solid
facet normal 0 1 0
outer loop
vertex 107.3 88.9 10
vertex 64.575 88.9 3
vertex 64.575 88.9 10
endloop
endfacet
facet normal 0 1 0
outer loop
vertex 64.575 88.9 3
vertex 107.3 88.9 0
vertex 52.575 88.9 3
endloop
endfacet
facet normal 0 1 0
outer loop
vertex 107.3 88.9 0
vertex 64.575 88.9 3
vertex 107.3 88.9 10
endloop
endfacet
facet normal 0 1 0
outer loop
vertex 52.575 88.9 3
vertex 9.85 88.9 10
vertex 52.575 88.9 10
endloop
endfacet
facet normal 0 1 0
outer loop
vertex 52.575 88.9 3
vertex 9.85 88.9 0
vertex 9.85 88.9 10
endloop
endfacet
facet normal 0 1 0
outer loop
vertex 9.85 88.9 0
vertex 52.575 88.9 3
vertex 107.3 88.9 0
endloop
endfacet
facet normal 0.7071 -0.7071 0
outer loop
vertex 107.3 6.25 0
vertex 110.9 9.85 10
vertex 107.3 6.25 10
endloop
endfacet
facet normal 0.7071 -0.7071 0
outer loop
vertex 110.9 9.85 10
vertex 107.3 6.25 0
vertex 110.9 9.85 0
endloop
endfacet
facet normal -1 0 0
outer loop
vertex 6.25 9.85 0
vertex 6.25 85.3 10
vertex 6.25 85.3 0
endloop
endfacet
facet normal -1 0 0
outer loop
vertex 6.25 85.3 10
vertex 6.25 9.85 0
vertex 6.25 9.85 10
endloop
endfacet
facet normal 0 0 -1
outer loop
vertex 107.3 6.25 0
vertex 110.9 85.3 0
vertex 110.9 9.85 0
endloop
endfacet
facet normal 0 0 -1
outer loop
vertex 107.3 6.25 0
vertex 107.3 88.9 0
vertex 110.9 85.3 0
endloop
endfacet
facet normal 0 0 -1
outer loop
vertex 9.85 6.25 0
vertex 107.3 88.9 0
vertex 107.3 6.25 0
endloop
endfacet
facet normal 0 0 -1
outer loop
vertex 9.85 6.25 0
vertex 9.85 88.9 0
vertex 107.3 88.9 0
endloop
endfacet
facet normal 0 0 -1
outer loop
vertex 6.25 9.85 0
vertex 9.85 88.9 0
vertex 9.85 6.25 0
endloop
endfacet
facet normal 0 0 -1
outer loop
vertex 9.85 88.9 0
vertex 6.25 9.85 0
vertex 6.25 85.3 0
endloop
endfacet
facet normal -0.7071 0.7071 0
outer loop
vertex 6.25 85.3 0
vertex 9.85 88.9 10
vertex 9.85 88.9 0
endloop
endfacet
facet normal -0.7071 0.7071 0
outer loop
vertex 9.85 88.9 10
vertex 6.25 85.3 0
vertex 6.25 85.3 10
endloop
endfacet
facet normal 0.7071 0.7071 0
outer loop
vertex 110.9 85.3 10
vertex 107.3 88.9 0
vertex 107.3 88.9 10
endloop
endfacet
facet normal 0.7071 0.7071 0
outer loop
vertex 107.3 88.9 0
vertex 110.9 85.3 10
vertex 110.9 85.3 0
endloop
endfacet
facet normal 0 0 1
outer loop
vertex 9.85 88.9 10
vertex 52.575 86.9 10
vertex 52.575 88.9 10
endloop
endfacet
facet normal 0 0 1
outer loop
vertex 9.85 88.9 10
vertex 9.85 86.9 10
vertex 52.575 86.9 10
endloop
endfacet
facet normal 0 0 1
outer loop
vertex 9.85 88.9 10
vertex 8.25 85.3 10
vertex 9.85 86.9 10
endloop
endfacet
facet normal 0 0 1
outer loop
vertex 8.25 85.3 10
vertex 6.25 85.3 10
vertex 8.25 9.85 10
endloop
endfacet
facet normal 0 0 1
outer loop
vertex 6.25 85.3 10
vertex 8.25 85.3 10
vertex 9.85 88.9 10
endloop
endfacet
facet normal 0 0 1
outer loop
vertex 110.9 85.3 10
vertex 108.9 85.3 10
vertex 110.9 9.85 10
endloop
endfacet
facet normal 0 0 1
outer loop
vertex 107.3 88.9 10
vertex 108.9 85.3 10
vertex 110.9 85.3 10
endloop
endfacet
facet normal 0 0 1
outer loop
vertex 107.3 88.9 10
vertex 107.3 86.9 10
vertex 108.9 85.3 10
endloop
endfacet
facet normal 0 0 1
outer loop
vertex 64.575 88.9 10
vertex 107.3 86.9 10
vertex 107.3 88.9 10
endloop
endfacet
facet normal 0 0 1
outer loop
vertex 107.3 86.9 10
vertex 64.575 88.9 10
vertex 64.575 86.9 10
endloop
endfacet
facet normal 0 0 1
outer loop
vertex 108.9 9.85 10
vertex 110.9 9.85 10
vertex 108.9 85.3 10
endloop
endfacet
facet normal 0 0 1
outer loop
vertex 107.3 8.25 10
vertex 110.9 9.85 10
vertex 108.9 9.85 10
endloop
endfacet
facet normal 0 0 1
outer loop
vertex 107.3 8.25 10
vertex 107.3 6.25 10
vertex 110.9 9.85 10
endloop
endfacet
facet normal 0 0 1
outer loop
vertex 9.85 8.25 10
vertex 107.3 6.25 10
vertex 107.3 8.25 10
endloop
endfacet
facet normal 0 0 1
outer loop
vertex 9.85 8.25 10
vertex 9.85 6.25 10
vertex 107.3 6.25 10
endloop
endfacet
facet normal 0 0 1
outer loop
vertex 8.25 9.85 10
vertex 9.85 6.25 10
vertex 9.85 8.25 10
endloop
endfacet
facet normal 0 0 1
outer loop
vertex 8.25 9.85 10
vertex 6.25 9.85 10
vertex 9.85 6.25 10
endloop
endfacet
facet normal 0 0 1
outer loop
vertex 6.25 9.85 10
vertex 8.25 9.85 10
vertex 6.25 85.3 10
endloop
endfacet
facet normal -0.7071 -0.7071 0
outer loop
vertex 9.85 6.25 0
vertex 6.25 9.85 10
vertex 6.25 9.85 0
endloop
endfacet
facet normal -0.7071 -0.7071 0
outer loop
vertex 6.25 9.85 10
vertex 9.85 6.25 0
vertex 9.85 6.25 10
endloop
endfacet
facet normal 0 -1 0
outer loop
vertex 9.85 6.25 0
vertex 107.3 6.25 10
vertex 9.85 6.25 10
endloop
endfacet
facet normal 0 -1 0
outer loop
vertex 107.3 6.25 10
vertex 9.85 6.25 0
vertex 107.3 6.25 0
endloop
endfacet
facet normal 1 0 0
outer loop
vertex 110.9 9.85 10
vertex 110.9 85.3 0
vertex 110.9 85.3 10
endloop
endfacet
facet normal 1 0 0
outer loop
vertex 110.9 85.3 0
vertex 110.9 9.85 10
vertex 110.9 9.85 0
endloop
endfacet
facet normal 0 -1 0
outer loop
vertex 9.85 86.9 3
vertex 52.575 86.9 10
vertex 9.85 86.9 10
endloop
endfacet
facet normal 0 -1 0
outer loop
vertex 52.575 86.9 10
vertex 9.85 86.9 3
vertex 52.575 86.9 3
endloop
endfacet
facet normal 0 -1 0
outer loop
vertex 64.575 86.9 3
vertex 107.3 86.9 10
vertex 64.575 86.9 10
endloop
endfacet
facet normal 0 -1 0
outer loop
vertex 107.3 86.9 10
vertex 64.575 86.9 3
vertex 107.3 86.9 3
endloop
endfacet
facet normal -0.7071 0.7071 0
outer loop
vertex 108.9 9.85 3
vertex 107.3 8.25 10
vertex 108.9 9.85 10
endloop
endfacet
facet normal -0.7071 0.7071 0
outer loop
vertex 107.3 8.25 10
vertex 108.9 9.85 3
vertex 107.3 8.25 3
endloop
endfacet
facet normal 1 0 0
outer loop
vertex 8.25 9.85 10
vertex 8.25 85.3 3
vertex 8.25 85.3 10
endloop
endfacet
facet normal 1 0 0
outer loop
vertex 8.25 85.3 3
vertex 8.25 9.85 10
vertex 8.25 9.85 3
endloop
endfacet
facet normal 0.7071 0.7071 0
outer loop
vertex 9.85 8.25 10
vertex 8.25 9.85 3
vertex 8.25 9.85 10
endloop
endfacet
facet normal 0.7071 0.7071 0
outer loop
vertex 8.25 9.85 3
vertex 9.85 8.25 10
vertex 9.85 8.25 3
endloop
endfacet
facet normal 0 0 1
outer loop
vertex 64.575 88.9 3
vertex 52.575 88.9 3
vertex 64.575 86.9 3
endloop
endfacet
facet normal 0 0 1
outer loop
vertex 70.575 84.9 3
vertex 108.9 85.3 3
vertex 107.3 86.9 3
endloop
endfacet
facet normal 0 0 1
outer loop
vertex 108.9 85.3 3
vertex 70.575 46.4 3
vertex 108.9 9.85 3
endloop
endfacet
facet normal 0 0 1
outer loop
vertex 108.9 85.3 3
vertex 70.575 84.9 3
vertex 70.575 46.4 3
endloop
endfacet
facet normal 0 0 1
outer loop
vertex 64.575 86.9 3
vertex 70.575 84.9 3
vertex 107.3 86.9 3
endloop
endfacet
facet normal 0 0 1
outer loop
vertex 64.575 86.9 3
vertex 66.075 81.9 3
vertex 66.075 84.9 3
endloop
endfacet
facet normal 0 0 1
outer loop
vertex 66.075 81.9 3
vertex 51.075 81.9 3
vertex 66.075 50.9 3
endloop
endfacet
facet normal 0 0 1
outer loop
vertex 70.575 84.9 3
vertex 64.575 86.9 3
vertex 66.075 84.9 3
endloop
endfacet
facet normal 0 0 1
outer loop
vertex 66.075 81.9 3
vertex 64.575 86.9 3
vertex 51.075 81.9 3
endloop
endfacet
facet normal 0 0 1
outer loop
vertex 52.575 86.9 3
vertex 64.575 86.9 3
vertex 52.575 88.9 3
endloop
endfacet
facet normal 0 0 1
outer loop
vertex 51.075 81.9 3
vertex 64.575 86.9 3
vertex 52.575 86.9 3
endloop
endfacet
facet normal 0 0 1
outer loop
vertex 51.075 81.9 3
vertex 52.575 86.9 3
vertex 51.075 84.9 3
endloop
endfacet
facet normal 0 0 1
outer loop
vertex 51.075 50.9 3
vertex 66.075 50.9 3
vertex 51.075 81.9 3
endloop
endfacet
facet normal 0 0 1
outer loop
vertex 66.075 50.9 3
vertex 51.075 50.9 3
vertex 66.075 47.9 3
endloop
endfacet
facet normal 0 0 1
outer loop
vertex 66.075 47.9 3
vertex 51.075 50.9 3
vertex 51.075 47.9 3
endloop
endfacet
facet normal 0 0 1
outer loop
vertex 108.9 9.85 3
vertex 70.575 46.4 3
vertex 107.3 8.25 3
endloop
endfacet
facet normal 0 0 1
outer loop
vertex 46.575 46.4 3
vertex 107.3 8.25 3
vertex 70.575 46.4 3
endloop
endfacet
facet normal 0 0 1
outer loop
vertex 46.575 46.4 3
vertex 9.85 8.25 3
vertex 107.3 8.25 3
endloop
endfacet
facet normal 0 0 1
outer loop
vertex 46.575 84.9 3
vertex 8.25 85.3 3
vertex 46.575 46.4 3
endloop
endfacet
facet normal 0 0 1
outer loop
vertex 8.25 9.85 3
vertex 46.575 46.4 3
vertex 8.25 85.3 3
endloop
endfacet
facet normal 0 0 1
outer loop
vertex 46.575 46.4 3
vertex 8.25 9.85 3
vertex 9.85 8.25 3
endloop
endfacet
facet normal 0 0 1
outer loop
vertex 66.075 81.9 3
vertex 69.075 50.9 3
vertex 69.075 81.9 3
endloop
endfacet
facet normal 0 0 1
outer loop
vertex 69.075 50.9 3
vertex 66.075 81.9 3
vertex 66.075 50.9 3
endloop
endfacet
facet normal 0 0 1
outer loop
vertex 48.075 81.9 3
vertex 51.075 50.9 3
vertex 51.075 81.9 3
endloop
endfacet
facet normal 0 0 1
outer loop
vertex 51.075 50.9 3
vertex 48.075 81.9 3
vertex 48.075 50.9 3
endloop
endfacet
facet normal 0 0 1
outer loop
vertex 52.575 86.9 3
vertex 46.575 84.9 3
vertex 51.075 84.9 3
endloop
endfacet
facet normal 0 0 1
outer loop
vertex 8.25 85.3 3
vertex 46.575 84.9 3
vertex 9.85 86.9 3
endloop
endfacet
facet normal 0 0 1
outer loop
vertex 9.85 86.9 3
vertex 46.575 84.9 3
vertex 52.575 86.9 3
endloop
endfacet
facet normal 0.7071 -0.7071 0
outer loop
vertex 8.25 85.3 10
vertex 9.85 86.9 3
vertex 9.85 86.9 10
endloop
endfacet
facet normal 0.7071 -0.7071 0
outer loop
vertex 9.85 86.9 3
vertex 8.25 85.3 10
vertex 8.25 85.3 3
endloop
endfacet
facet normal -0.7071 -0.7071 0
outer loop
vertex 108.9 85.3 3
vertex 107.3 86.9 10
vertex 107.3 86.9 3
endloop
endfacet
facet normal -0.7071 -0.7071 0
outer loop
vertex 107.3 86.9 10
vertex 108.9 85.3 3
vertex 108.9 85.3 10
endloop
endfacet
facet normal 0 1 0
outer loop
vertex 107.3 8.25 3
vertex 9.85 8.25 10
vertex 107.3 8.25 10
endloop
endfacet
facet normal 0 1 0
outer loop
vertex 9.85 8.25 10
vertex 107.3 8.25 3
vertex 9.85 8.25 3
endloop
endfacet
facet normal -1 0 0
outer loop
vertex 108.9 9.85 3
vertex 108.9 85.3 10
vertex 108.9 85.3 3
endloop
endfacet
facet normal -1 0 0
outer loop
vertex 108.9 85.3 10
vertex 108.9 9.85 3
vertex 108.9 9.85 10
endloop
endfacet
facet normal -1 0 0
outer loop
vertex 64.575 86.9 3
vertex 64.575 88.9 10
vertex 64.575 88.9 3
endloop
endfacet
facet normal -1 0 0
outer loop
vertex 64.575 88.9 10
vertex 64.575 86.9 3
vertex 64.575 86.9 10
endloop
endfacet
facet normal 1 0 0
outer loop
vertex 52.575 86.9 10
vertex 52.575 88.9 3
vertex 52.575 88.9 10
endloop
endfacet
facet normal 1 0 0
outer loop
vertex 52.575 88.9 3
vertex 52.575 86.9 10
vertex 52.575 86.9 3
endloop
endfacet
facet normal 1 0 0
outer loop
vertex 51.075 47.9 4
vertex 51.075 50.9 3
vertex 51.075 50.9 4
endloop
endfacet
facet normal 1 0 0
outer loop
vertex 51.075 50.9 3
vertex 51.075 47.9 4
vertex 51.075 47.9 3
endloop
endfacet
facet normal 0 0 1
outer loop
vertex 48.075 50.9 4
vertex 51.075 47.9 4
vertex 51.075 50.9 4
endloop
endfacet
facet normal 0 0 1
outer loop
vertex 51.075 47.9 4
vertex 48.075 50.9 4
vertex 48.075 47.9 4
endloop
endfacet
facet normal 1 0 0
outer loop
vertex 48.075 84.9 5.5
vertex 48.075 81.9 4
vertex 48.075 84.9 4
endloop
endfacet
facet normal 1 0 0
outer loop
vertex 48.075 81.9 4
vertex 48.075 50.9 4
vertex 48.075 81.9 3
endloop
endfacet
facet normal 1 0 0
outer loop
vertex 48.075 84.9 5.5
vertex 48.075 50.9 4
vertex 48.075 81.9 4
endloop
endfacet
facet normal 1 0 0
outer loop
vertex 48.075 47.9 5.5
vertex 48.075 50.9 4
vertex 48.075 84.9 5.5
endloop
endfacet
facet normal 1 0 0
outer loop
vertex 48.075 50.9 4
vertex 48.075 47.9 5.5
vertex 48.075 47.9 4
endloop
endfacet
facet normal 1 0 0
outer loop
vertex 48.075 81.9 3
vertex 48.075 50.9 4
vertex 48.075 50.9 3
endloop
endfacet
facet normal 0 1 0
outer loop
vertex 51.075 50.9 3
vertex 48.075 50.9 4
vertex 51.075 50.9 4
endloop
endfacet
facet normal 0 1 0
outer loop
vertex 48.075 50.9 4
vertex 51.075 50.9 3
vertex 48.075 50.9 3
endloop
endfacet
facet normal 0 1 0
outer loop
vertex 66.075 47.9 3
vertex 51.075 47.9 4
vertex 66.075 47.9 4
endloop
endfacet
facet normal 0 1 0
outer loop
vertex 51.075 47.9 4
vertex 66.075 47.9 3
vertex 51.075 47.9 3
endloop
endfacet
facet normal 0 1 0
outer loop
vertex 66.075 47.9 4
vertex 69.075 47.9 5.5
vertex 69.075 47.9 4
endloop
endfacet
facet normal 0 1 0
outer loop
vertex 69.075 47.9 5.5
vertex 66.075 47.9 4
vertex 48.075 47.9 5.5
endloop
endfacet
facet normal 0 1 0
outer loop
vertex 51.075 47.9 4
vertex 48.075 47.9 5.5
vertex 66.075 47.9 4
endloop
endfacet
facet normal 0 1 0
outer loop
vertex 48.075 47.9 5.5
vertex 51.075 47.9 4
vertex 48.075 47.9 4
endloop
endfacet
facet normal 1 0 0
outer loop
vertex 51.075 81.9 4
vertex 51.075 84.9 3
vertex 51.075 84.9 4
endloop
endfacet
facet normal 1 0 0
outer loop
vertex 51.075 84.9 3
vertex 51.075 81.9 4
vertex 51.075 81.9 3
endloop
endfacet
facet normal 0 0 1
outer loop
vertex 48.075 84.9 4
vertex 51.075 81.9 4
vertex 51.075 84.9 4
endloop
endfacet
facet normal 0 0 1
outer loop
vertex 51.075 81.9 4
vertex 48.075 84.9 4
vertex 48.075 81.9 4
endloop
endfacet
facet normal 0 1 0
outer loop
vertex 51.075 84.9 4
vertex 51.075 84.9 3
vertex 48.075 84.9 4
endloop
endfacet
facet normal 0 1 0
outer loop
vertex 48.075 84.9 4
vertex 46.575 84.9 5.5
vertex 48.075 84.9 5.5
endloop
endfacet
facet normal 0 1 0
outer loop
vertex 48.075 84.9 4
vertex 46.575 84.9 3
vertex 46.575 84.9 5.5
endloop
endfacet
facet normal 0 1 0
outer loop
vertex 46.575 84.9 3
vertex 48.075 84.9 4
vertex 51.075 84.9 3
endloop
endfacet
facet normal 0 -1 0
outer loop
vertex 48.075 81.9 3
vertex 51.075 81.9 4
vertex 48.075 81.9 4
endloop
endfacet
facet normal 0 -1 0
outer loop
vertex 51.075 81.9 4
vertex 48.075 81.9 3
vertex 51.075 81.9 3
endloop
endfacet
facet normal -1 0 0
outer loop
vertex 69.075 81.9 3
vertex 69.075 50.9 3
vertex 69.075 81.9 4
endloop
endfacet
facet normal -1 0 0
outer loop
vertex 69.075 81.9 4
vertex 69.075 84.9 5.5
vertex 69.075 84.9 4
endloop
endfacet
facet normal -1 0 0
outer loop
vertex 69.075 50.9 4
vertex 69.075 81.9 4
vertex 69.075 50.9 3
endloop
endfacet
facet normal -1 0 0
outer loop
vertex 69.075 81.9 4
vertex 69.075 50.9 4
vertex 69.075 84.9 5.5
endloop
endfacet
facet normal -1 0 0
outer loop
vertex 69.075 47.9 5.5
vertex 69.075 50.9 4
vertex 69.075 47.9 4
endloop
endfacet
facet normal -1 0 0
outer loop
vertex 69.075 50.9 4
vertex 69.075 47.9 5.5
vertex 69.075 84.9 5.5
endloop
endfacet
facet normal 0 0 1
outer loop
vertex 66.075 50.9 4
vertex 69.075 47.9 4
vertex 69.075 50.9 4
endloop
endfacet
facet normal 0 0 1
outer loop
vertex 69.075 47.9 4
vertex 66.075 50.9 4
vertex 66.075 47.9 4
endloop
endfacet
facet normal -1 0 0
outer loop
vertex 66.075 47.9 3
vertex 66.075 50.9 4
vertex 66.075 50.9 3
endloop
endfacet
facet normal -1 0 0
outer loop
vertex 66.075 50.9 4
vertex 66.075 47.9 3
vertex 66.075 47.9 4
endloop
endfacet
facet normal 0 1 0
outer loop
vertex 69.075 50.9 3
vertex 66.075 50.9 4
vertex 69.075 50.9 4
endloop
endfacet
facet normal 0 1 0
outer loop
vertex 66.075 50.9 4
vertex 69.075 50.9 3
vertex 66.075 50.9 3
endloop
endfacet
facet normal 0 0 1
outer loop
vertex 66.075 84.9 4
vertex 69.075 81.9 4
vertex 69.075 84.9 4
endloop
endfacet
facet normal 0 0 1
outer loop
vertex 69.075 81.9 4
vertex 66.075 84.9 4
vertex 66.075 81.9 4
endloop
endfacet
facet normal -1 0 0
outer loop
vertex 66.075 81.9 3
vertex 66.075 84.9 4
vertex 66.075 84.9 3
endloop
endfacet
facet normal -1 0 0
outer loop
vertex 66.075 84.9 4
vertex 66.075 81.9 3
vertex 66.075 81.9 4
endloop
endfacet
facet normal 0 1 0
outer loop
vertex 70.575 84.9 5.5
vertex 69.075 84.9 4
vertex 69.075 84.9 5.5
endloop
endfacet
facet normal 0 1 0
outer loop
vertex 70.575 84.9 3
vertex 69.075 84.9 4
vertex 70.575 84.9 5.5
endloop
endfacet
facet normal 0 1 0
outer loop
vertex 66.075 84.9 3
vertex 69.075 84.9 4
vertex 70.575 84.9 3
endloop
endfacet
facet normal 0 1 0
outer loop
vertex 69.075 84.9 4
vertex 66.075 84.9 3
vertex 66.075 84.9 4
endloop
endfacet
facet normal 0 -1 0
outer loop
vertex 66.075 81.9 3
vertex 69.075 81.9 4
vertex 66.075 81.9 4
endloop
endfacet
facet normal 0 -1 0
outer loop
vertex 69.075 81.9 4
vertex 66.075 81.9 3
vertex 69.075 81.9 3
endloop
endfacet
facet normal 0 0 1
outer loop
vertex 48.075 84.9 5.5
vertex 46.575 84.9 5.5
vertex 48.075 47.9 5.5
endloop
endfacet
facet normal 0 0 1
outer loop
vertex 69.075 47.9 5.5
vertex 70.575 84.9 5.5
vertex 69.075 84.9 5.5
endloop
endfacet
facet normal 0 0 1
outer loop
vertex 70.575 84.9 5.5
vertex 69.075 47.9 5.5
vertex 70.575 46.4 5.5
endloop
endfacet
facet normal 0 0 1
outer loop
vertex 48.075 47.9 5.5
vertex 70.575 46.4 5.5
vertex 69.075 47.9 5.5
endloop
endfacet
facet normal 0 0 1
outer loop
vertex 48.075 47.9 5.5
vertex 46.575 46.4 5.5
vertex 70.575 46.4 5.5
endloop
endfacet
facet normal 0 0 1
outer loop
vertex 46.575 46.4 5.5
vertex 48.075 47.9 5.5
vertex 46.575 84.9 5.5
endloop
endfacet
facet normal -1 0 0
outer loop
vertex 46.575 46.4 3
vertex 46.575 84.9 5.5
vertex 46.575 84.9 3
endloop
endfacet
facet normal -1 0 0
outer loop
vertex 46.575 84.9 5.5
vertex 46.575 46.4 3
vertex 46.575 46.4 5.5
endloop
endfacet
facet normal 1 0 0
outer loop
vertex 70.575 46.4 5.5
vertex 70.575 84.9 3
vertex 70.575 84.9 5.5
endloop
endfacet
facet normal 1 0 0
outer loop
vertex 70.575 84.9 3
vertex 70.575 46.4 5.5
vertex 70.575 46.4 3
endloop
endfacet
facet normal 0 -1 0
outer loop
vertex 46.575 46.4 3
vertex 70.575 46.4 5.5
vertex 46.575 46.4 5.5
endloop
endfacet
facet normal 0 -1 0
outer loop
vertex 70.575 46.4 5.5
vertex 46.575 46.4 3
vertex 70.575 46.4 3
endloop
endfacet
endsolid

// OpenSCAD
// file: case_params.scad
// Stream Deck Macro — shared case dimensions (included by top/bottom/assembly)

// ---- Our target layout ----
switch_hole   = 14;
switch_pitch  = 19.05;
grid_cols     = 4;
grid_rows     = 4;
grid_span     = (grid_cols - 1) * switch_pitch + switch_hole; // 71.15

encoder_d     = 7;       // CONFIRMED two ways: caliper-measured on the actual purchased part,
                          // and matches the encoder's own spec — Keszoox's EC11 datasheet states
                          // "Panel Mount — M7 thread fits standard 7mm panel holes with included
                          // nut" for this exact family (EC11, 15mm shaft, half/D-shaft — matches
                          // the purchased "G 15mm Half handle" spec). No longer a placeholder.
encoder_count = 3;
encoder_gap   = 15;

margin = 12;

// ---- Shell style ----
corner_chamfer = 6;    // diagonal cut on each of the 4 corners
rim_height     = 20;   // total wall height (top to bottom), 2cm per feedback
bevel_height   = 3;    // top tapered collar height
bevel_inset    = 3;    // how far the top face is inset from the outer wall
border         = 6;    // rim wall thickness (outer edge to inner hollow)
deck_recess    = 2.5;  // how far below the rim top the switch deck sits
deck_thickness = 2.5;  // thickness of the switch deck floor

// switch_hole (14mm) and switch_pitch (19.05mm) are the universal Cherry
// MX-compatible plate-mount standard — every mechanical switch
// manufacturer uses this same spacing, Outemu (the purchased switch,
// "Dustproof Brown") included. Not brand-specific, so there's nothing to
// confirm against the specific part the way encoder_d needed — this was
// already correct.

plate_w = margin*2 + grid_span + encoder_gap + encoder_d;
plate_d = margin*2 + grid_span;

// ---- Arduino Pro Micro mount (off-the-shelf part) ----
// CONFIRMED (AliExpress order, seller A+A+A Store): "MICRO/MINI/TYPE-C USB
// Pro Micro para arduino ATmega32U4", ordered as TYPE-C USB 5V/16MHz — NOT
// Micro-USB, correcting an earlier assumption this file was built around.
// Board size still web-sourced, not caliper-measured: multiple listings
// (Probots, Envistia Mall, Makers Electronics) cite ~33x18mm for this
// family; Keebio notes the USB-C variant specifically runs ~3mm longer
// than the Micro-USB version (~36mm) because of the connector footprint.
// arduino_l=38 already covers that with ~2mm to spare. Confirm with
// calipers before printing final — same convention as encoder_d.
//
// USB-C connector: standard panel-mount cutout per connector datasheets is
// 12mm x 8.4mm (the bare plug shell is ~8.4mm wide x 2.6-2.9mm tall, but
// the cable's outer sleeve needs the fuller cutout to actually pass
// through). usb_cutout_w/h below (12x9) already satisfy that with a
// little extra margin on height — no change needed now that the
// connector type is confirmed, this is just the correct citation for why
// those numbers work, replacing the old Micro-USB-based reasoning.
arduino_l          = 37;   // pocket length (Y) — tightened from a generic 38mm margin. Better
                            // data now: base Pro Micro is ~33mm, and Keebio (who sells the exact
                            // USB-C variant) states it specifically runs ~3mm longer than the
                            // Micro-USB version because of the connector footprint = ~36mm for
                            // this board. 37mm leaves 1mm clearance, tighter than before because
                            // this number is better-reasoned now, not because the underlying
                            // uncertainty (calipers not yet done) has changed.
arduino_w          = 21;   // pocket width (X) — board's ~18-18.4mm wide edge + margin. Width
                            // doesn't vary between Micro-USB/USB-C variants (only length does,
                            // from the connector), so no equivalent tightening applies here.
arduino_wall_t     = 1.5;  // retaining wall thickness (bottom tray)
arduino_wall_h     = 2.5;  // retaining wall height — keeps the board from sliding sideways
arduino_standoff_h = 1;    // corner standoff height — lifts the board off the floor slightly,
                            // clearing any solder blobs on the underside

usb_cutout_w  = 12;  // wall cutout width — matches the standard USB-C panel cutout width
usb_cutout_h  = 9;   // wall cutout height — standard USB-C panel cutout is 8.4mm; 9mm keeps
                      // a small margin above that
usb_cutout_z0 = 2;   // wall cutout bottom, world Z — still an ESTIMATE (~5.5mm port center
                      // above the tray floor), not measured against the actual board's port
                      // height. This is unrelated to the Micro-USB/USB-C question and still
                      // needs a test-fit or caliper check before printing final.

// Board centered in X, pushed to the BACK (max Y) of the case, USB port
// facing the back wall so the cable exits there — position shared between
// case_v4_bottom.scad (the pocket) and case_v4_top.scad (the wall cutout)
// so they're guaranteed to align, rather than two separately-guessed numbers.
arduino_x_center = plate_w / 2;
arduino_y_back   = plate_d - border - 4.25; // The tray's own inner cavity back boundary sits at
                            // plate_d - border - fit_clearance(0.25) - wall_thickness(2) = 86.9,
                            // not plate_d - border(89.15) — those extra two values belong to
                            // case_v4_bottom.scad specifically. Using -4.25 here (2mm safety
                            // margin past that real boundary) keeps the pocket safely inside the
                            // tray's actual cavity instead of overlapping its own back wall.

module chamfered_rect(w, d, c) {
    polygon(points = [
        [c, 0], [w - c, 0],
        [w, c], [w, d - c],
        [w - c, d], [c, d],
        [0, d - c], [0, c]
    ]);
}
// main file
// Stream Deck Macro — bottom plate v4 (tray with sliding wall)
// Slides up into the top piece's inner cavity from below. The tray's outer
// wall matches the top's inner hollow, minus a small per-side clearance so
// it can actually slide in once printed.

include <case_params.scad>

fit_clearance    = 0.25; // per-side gap for a sliding fit
floor_thickness  = 3;    // tray floor thickness
wall_thickness   = 2;    // tray's own perimeter wall thickness
wall_height      = 10;   // how tall the tray wall is (slides into the top's cavity)

bottom_w = (plate_w - 2*border) - 2*fit_clearance;
bottom_d = (plate_d - 2*border) - 2*fit_clearance;
bottom_chamfer = corner_chamfer * 0.6;

module arduino_mount() {
    // 3-sided retaining wall — left, right, and the far (low-Y) side —
    // left OPEN on the back (high-Y) side facing the USB cutout, so
    // there's nothing blocking cable clearance or sliding the board in
    // from that direction. Corner standoffs lift the board slightly off
    // the floor.
    z0 = floor_thickness;
    x0 = arduino_x_center - arduino_w/2;
    y0 = arduino_y_back - arduino_l;
    translate([x0 - arduino_wall_t, y0, z0])
        cube([arduino_wall_t, arduino_l, arduino_wall_h]);
    translate([x0 + arduino_w, y0, z0])
        cube([arduino_wall_t, arduino_l, arduino_wall_h]);
    translate([x0 - arduino_wall_t, y0 - arduino_wall_t, z0])
        cube([arduino_w + 2*arduino_wall_t, arduino_wall_t, arduino_wall_h]);
    standoff_size = 3;
    for (dx = [0, arduino_w - standoff_size])
        for (dy = [0, arduino_l - standoff_size])
            translate([x0 + dx, y0 + dy, z0])
                cube([standoff_size, standoff_size, arduino_standoff_h]);
}

module case_bottom() {
    translate([border + fit_clearance, border + fit_clearance, 0])
        difference() {
            linear_extrude(height = wall_height)
                chamfered_rect(bottom_w, bottom_d, bottom_chamfer);
            translate([wall_thickness, wall_thickness, floor_thickness])
                linear_extrude(height = wall_height)
                    chamfered_rect(bottom_w - 2*wall_thickness,
                                   bottom_d - 2*wall_thickness,
                                   max(bottom_chamfer - wall_thickness, 0.1));
            // USB cable notch through the TRAY'S OWN back wall — without
            // this, the wall added a few lines above (wall_thickness
            // thick) sits directly between the Arduino pocket and the
            // matching cutout in the mount's back wall, blocking the
            // cable path entirely. Reported directly: "the hole for the
            // cable is blocked for the back wall of the bottom."
            // bottom_w/2 in this LOCAL frame is exactly arduino_x_center
            // in world coordinates (border+fit_clearance cancels out),
            // so this lines up with the mount's cutout without needing
            // to duplicate that math.
            translate([bottom_w/2 - usb_cutout_w/2, bottom_d - wall_thickness - 1, floor_thickness])
                cube([usb_cutout_w, wall_thickness + 2, wall_height - floor_thickness + 1]);
        }
    arduino_mount();
}

case_bottom();
